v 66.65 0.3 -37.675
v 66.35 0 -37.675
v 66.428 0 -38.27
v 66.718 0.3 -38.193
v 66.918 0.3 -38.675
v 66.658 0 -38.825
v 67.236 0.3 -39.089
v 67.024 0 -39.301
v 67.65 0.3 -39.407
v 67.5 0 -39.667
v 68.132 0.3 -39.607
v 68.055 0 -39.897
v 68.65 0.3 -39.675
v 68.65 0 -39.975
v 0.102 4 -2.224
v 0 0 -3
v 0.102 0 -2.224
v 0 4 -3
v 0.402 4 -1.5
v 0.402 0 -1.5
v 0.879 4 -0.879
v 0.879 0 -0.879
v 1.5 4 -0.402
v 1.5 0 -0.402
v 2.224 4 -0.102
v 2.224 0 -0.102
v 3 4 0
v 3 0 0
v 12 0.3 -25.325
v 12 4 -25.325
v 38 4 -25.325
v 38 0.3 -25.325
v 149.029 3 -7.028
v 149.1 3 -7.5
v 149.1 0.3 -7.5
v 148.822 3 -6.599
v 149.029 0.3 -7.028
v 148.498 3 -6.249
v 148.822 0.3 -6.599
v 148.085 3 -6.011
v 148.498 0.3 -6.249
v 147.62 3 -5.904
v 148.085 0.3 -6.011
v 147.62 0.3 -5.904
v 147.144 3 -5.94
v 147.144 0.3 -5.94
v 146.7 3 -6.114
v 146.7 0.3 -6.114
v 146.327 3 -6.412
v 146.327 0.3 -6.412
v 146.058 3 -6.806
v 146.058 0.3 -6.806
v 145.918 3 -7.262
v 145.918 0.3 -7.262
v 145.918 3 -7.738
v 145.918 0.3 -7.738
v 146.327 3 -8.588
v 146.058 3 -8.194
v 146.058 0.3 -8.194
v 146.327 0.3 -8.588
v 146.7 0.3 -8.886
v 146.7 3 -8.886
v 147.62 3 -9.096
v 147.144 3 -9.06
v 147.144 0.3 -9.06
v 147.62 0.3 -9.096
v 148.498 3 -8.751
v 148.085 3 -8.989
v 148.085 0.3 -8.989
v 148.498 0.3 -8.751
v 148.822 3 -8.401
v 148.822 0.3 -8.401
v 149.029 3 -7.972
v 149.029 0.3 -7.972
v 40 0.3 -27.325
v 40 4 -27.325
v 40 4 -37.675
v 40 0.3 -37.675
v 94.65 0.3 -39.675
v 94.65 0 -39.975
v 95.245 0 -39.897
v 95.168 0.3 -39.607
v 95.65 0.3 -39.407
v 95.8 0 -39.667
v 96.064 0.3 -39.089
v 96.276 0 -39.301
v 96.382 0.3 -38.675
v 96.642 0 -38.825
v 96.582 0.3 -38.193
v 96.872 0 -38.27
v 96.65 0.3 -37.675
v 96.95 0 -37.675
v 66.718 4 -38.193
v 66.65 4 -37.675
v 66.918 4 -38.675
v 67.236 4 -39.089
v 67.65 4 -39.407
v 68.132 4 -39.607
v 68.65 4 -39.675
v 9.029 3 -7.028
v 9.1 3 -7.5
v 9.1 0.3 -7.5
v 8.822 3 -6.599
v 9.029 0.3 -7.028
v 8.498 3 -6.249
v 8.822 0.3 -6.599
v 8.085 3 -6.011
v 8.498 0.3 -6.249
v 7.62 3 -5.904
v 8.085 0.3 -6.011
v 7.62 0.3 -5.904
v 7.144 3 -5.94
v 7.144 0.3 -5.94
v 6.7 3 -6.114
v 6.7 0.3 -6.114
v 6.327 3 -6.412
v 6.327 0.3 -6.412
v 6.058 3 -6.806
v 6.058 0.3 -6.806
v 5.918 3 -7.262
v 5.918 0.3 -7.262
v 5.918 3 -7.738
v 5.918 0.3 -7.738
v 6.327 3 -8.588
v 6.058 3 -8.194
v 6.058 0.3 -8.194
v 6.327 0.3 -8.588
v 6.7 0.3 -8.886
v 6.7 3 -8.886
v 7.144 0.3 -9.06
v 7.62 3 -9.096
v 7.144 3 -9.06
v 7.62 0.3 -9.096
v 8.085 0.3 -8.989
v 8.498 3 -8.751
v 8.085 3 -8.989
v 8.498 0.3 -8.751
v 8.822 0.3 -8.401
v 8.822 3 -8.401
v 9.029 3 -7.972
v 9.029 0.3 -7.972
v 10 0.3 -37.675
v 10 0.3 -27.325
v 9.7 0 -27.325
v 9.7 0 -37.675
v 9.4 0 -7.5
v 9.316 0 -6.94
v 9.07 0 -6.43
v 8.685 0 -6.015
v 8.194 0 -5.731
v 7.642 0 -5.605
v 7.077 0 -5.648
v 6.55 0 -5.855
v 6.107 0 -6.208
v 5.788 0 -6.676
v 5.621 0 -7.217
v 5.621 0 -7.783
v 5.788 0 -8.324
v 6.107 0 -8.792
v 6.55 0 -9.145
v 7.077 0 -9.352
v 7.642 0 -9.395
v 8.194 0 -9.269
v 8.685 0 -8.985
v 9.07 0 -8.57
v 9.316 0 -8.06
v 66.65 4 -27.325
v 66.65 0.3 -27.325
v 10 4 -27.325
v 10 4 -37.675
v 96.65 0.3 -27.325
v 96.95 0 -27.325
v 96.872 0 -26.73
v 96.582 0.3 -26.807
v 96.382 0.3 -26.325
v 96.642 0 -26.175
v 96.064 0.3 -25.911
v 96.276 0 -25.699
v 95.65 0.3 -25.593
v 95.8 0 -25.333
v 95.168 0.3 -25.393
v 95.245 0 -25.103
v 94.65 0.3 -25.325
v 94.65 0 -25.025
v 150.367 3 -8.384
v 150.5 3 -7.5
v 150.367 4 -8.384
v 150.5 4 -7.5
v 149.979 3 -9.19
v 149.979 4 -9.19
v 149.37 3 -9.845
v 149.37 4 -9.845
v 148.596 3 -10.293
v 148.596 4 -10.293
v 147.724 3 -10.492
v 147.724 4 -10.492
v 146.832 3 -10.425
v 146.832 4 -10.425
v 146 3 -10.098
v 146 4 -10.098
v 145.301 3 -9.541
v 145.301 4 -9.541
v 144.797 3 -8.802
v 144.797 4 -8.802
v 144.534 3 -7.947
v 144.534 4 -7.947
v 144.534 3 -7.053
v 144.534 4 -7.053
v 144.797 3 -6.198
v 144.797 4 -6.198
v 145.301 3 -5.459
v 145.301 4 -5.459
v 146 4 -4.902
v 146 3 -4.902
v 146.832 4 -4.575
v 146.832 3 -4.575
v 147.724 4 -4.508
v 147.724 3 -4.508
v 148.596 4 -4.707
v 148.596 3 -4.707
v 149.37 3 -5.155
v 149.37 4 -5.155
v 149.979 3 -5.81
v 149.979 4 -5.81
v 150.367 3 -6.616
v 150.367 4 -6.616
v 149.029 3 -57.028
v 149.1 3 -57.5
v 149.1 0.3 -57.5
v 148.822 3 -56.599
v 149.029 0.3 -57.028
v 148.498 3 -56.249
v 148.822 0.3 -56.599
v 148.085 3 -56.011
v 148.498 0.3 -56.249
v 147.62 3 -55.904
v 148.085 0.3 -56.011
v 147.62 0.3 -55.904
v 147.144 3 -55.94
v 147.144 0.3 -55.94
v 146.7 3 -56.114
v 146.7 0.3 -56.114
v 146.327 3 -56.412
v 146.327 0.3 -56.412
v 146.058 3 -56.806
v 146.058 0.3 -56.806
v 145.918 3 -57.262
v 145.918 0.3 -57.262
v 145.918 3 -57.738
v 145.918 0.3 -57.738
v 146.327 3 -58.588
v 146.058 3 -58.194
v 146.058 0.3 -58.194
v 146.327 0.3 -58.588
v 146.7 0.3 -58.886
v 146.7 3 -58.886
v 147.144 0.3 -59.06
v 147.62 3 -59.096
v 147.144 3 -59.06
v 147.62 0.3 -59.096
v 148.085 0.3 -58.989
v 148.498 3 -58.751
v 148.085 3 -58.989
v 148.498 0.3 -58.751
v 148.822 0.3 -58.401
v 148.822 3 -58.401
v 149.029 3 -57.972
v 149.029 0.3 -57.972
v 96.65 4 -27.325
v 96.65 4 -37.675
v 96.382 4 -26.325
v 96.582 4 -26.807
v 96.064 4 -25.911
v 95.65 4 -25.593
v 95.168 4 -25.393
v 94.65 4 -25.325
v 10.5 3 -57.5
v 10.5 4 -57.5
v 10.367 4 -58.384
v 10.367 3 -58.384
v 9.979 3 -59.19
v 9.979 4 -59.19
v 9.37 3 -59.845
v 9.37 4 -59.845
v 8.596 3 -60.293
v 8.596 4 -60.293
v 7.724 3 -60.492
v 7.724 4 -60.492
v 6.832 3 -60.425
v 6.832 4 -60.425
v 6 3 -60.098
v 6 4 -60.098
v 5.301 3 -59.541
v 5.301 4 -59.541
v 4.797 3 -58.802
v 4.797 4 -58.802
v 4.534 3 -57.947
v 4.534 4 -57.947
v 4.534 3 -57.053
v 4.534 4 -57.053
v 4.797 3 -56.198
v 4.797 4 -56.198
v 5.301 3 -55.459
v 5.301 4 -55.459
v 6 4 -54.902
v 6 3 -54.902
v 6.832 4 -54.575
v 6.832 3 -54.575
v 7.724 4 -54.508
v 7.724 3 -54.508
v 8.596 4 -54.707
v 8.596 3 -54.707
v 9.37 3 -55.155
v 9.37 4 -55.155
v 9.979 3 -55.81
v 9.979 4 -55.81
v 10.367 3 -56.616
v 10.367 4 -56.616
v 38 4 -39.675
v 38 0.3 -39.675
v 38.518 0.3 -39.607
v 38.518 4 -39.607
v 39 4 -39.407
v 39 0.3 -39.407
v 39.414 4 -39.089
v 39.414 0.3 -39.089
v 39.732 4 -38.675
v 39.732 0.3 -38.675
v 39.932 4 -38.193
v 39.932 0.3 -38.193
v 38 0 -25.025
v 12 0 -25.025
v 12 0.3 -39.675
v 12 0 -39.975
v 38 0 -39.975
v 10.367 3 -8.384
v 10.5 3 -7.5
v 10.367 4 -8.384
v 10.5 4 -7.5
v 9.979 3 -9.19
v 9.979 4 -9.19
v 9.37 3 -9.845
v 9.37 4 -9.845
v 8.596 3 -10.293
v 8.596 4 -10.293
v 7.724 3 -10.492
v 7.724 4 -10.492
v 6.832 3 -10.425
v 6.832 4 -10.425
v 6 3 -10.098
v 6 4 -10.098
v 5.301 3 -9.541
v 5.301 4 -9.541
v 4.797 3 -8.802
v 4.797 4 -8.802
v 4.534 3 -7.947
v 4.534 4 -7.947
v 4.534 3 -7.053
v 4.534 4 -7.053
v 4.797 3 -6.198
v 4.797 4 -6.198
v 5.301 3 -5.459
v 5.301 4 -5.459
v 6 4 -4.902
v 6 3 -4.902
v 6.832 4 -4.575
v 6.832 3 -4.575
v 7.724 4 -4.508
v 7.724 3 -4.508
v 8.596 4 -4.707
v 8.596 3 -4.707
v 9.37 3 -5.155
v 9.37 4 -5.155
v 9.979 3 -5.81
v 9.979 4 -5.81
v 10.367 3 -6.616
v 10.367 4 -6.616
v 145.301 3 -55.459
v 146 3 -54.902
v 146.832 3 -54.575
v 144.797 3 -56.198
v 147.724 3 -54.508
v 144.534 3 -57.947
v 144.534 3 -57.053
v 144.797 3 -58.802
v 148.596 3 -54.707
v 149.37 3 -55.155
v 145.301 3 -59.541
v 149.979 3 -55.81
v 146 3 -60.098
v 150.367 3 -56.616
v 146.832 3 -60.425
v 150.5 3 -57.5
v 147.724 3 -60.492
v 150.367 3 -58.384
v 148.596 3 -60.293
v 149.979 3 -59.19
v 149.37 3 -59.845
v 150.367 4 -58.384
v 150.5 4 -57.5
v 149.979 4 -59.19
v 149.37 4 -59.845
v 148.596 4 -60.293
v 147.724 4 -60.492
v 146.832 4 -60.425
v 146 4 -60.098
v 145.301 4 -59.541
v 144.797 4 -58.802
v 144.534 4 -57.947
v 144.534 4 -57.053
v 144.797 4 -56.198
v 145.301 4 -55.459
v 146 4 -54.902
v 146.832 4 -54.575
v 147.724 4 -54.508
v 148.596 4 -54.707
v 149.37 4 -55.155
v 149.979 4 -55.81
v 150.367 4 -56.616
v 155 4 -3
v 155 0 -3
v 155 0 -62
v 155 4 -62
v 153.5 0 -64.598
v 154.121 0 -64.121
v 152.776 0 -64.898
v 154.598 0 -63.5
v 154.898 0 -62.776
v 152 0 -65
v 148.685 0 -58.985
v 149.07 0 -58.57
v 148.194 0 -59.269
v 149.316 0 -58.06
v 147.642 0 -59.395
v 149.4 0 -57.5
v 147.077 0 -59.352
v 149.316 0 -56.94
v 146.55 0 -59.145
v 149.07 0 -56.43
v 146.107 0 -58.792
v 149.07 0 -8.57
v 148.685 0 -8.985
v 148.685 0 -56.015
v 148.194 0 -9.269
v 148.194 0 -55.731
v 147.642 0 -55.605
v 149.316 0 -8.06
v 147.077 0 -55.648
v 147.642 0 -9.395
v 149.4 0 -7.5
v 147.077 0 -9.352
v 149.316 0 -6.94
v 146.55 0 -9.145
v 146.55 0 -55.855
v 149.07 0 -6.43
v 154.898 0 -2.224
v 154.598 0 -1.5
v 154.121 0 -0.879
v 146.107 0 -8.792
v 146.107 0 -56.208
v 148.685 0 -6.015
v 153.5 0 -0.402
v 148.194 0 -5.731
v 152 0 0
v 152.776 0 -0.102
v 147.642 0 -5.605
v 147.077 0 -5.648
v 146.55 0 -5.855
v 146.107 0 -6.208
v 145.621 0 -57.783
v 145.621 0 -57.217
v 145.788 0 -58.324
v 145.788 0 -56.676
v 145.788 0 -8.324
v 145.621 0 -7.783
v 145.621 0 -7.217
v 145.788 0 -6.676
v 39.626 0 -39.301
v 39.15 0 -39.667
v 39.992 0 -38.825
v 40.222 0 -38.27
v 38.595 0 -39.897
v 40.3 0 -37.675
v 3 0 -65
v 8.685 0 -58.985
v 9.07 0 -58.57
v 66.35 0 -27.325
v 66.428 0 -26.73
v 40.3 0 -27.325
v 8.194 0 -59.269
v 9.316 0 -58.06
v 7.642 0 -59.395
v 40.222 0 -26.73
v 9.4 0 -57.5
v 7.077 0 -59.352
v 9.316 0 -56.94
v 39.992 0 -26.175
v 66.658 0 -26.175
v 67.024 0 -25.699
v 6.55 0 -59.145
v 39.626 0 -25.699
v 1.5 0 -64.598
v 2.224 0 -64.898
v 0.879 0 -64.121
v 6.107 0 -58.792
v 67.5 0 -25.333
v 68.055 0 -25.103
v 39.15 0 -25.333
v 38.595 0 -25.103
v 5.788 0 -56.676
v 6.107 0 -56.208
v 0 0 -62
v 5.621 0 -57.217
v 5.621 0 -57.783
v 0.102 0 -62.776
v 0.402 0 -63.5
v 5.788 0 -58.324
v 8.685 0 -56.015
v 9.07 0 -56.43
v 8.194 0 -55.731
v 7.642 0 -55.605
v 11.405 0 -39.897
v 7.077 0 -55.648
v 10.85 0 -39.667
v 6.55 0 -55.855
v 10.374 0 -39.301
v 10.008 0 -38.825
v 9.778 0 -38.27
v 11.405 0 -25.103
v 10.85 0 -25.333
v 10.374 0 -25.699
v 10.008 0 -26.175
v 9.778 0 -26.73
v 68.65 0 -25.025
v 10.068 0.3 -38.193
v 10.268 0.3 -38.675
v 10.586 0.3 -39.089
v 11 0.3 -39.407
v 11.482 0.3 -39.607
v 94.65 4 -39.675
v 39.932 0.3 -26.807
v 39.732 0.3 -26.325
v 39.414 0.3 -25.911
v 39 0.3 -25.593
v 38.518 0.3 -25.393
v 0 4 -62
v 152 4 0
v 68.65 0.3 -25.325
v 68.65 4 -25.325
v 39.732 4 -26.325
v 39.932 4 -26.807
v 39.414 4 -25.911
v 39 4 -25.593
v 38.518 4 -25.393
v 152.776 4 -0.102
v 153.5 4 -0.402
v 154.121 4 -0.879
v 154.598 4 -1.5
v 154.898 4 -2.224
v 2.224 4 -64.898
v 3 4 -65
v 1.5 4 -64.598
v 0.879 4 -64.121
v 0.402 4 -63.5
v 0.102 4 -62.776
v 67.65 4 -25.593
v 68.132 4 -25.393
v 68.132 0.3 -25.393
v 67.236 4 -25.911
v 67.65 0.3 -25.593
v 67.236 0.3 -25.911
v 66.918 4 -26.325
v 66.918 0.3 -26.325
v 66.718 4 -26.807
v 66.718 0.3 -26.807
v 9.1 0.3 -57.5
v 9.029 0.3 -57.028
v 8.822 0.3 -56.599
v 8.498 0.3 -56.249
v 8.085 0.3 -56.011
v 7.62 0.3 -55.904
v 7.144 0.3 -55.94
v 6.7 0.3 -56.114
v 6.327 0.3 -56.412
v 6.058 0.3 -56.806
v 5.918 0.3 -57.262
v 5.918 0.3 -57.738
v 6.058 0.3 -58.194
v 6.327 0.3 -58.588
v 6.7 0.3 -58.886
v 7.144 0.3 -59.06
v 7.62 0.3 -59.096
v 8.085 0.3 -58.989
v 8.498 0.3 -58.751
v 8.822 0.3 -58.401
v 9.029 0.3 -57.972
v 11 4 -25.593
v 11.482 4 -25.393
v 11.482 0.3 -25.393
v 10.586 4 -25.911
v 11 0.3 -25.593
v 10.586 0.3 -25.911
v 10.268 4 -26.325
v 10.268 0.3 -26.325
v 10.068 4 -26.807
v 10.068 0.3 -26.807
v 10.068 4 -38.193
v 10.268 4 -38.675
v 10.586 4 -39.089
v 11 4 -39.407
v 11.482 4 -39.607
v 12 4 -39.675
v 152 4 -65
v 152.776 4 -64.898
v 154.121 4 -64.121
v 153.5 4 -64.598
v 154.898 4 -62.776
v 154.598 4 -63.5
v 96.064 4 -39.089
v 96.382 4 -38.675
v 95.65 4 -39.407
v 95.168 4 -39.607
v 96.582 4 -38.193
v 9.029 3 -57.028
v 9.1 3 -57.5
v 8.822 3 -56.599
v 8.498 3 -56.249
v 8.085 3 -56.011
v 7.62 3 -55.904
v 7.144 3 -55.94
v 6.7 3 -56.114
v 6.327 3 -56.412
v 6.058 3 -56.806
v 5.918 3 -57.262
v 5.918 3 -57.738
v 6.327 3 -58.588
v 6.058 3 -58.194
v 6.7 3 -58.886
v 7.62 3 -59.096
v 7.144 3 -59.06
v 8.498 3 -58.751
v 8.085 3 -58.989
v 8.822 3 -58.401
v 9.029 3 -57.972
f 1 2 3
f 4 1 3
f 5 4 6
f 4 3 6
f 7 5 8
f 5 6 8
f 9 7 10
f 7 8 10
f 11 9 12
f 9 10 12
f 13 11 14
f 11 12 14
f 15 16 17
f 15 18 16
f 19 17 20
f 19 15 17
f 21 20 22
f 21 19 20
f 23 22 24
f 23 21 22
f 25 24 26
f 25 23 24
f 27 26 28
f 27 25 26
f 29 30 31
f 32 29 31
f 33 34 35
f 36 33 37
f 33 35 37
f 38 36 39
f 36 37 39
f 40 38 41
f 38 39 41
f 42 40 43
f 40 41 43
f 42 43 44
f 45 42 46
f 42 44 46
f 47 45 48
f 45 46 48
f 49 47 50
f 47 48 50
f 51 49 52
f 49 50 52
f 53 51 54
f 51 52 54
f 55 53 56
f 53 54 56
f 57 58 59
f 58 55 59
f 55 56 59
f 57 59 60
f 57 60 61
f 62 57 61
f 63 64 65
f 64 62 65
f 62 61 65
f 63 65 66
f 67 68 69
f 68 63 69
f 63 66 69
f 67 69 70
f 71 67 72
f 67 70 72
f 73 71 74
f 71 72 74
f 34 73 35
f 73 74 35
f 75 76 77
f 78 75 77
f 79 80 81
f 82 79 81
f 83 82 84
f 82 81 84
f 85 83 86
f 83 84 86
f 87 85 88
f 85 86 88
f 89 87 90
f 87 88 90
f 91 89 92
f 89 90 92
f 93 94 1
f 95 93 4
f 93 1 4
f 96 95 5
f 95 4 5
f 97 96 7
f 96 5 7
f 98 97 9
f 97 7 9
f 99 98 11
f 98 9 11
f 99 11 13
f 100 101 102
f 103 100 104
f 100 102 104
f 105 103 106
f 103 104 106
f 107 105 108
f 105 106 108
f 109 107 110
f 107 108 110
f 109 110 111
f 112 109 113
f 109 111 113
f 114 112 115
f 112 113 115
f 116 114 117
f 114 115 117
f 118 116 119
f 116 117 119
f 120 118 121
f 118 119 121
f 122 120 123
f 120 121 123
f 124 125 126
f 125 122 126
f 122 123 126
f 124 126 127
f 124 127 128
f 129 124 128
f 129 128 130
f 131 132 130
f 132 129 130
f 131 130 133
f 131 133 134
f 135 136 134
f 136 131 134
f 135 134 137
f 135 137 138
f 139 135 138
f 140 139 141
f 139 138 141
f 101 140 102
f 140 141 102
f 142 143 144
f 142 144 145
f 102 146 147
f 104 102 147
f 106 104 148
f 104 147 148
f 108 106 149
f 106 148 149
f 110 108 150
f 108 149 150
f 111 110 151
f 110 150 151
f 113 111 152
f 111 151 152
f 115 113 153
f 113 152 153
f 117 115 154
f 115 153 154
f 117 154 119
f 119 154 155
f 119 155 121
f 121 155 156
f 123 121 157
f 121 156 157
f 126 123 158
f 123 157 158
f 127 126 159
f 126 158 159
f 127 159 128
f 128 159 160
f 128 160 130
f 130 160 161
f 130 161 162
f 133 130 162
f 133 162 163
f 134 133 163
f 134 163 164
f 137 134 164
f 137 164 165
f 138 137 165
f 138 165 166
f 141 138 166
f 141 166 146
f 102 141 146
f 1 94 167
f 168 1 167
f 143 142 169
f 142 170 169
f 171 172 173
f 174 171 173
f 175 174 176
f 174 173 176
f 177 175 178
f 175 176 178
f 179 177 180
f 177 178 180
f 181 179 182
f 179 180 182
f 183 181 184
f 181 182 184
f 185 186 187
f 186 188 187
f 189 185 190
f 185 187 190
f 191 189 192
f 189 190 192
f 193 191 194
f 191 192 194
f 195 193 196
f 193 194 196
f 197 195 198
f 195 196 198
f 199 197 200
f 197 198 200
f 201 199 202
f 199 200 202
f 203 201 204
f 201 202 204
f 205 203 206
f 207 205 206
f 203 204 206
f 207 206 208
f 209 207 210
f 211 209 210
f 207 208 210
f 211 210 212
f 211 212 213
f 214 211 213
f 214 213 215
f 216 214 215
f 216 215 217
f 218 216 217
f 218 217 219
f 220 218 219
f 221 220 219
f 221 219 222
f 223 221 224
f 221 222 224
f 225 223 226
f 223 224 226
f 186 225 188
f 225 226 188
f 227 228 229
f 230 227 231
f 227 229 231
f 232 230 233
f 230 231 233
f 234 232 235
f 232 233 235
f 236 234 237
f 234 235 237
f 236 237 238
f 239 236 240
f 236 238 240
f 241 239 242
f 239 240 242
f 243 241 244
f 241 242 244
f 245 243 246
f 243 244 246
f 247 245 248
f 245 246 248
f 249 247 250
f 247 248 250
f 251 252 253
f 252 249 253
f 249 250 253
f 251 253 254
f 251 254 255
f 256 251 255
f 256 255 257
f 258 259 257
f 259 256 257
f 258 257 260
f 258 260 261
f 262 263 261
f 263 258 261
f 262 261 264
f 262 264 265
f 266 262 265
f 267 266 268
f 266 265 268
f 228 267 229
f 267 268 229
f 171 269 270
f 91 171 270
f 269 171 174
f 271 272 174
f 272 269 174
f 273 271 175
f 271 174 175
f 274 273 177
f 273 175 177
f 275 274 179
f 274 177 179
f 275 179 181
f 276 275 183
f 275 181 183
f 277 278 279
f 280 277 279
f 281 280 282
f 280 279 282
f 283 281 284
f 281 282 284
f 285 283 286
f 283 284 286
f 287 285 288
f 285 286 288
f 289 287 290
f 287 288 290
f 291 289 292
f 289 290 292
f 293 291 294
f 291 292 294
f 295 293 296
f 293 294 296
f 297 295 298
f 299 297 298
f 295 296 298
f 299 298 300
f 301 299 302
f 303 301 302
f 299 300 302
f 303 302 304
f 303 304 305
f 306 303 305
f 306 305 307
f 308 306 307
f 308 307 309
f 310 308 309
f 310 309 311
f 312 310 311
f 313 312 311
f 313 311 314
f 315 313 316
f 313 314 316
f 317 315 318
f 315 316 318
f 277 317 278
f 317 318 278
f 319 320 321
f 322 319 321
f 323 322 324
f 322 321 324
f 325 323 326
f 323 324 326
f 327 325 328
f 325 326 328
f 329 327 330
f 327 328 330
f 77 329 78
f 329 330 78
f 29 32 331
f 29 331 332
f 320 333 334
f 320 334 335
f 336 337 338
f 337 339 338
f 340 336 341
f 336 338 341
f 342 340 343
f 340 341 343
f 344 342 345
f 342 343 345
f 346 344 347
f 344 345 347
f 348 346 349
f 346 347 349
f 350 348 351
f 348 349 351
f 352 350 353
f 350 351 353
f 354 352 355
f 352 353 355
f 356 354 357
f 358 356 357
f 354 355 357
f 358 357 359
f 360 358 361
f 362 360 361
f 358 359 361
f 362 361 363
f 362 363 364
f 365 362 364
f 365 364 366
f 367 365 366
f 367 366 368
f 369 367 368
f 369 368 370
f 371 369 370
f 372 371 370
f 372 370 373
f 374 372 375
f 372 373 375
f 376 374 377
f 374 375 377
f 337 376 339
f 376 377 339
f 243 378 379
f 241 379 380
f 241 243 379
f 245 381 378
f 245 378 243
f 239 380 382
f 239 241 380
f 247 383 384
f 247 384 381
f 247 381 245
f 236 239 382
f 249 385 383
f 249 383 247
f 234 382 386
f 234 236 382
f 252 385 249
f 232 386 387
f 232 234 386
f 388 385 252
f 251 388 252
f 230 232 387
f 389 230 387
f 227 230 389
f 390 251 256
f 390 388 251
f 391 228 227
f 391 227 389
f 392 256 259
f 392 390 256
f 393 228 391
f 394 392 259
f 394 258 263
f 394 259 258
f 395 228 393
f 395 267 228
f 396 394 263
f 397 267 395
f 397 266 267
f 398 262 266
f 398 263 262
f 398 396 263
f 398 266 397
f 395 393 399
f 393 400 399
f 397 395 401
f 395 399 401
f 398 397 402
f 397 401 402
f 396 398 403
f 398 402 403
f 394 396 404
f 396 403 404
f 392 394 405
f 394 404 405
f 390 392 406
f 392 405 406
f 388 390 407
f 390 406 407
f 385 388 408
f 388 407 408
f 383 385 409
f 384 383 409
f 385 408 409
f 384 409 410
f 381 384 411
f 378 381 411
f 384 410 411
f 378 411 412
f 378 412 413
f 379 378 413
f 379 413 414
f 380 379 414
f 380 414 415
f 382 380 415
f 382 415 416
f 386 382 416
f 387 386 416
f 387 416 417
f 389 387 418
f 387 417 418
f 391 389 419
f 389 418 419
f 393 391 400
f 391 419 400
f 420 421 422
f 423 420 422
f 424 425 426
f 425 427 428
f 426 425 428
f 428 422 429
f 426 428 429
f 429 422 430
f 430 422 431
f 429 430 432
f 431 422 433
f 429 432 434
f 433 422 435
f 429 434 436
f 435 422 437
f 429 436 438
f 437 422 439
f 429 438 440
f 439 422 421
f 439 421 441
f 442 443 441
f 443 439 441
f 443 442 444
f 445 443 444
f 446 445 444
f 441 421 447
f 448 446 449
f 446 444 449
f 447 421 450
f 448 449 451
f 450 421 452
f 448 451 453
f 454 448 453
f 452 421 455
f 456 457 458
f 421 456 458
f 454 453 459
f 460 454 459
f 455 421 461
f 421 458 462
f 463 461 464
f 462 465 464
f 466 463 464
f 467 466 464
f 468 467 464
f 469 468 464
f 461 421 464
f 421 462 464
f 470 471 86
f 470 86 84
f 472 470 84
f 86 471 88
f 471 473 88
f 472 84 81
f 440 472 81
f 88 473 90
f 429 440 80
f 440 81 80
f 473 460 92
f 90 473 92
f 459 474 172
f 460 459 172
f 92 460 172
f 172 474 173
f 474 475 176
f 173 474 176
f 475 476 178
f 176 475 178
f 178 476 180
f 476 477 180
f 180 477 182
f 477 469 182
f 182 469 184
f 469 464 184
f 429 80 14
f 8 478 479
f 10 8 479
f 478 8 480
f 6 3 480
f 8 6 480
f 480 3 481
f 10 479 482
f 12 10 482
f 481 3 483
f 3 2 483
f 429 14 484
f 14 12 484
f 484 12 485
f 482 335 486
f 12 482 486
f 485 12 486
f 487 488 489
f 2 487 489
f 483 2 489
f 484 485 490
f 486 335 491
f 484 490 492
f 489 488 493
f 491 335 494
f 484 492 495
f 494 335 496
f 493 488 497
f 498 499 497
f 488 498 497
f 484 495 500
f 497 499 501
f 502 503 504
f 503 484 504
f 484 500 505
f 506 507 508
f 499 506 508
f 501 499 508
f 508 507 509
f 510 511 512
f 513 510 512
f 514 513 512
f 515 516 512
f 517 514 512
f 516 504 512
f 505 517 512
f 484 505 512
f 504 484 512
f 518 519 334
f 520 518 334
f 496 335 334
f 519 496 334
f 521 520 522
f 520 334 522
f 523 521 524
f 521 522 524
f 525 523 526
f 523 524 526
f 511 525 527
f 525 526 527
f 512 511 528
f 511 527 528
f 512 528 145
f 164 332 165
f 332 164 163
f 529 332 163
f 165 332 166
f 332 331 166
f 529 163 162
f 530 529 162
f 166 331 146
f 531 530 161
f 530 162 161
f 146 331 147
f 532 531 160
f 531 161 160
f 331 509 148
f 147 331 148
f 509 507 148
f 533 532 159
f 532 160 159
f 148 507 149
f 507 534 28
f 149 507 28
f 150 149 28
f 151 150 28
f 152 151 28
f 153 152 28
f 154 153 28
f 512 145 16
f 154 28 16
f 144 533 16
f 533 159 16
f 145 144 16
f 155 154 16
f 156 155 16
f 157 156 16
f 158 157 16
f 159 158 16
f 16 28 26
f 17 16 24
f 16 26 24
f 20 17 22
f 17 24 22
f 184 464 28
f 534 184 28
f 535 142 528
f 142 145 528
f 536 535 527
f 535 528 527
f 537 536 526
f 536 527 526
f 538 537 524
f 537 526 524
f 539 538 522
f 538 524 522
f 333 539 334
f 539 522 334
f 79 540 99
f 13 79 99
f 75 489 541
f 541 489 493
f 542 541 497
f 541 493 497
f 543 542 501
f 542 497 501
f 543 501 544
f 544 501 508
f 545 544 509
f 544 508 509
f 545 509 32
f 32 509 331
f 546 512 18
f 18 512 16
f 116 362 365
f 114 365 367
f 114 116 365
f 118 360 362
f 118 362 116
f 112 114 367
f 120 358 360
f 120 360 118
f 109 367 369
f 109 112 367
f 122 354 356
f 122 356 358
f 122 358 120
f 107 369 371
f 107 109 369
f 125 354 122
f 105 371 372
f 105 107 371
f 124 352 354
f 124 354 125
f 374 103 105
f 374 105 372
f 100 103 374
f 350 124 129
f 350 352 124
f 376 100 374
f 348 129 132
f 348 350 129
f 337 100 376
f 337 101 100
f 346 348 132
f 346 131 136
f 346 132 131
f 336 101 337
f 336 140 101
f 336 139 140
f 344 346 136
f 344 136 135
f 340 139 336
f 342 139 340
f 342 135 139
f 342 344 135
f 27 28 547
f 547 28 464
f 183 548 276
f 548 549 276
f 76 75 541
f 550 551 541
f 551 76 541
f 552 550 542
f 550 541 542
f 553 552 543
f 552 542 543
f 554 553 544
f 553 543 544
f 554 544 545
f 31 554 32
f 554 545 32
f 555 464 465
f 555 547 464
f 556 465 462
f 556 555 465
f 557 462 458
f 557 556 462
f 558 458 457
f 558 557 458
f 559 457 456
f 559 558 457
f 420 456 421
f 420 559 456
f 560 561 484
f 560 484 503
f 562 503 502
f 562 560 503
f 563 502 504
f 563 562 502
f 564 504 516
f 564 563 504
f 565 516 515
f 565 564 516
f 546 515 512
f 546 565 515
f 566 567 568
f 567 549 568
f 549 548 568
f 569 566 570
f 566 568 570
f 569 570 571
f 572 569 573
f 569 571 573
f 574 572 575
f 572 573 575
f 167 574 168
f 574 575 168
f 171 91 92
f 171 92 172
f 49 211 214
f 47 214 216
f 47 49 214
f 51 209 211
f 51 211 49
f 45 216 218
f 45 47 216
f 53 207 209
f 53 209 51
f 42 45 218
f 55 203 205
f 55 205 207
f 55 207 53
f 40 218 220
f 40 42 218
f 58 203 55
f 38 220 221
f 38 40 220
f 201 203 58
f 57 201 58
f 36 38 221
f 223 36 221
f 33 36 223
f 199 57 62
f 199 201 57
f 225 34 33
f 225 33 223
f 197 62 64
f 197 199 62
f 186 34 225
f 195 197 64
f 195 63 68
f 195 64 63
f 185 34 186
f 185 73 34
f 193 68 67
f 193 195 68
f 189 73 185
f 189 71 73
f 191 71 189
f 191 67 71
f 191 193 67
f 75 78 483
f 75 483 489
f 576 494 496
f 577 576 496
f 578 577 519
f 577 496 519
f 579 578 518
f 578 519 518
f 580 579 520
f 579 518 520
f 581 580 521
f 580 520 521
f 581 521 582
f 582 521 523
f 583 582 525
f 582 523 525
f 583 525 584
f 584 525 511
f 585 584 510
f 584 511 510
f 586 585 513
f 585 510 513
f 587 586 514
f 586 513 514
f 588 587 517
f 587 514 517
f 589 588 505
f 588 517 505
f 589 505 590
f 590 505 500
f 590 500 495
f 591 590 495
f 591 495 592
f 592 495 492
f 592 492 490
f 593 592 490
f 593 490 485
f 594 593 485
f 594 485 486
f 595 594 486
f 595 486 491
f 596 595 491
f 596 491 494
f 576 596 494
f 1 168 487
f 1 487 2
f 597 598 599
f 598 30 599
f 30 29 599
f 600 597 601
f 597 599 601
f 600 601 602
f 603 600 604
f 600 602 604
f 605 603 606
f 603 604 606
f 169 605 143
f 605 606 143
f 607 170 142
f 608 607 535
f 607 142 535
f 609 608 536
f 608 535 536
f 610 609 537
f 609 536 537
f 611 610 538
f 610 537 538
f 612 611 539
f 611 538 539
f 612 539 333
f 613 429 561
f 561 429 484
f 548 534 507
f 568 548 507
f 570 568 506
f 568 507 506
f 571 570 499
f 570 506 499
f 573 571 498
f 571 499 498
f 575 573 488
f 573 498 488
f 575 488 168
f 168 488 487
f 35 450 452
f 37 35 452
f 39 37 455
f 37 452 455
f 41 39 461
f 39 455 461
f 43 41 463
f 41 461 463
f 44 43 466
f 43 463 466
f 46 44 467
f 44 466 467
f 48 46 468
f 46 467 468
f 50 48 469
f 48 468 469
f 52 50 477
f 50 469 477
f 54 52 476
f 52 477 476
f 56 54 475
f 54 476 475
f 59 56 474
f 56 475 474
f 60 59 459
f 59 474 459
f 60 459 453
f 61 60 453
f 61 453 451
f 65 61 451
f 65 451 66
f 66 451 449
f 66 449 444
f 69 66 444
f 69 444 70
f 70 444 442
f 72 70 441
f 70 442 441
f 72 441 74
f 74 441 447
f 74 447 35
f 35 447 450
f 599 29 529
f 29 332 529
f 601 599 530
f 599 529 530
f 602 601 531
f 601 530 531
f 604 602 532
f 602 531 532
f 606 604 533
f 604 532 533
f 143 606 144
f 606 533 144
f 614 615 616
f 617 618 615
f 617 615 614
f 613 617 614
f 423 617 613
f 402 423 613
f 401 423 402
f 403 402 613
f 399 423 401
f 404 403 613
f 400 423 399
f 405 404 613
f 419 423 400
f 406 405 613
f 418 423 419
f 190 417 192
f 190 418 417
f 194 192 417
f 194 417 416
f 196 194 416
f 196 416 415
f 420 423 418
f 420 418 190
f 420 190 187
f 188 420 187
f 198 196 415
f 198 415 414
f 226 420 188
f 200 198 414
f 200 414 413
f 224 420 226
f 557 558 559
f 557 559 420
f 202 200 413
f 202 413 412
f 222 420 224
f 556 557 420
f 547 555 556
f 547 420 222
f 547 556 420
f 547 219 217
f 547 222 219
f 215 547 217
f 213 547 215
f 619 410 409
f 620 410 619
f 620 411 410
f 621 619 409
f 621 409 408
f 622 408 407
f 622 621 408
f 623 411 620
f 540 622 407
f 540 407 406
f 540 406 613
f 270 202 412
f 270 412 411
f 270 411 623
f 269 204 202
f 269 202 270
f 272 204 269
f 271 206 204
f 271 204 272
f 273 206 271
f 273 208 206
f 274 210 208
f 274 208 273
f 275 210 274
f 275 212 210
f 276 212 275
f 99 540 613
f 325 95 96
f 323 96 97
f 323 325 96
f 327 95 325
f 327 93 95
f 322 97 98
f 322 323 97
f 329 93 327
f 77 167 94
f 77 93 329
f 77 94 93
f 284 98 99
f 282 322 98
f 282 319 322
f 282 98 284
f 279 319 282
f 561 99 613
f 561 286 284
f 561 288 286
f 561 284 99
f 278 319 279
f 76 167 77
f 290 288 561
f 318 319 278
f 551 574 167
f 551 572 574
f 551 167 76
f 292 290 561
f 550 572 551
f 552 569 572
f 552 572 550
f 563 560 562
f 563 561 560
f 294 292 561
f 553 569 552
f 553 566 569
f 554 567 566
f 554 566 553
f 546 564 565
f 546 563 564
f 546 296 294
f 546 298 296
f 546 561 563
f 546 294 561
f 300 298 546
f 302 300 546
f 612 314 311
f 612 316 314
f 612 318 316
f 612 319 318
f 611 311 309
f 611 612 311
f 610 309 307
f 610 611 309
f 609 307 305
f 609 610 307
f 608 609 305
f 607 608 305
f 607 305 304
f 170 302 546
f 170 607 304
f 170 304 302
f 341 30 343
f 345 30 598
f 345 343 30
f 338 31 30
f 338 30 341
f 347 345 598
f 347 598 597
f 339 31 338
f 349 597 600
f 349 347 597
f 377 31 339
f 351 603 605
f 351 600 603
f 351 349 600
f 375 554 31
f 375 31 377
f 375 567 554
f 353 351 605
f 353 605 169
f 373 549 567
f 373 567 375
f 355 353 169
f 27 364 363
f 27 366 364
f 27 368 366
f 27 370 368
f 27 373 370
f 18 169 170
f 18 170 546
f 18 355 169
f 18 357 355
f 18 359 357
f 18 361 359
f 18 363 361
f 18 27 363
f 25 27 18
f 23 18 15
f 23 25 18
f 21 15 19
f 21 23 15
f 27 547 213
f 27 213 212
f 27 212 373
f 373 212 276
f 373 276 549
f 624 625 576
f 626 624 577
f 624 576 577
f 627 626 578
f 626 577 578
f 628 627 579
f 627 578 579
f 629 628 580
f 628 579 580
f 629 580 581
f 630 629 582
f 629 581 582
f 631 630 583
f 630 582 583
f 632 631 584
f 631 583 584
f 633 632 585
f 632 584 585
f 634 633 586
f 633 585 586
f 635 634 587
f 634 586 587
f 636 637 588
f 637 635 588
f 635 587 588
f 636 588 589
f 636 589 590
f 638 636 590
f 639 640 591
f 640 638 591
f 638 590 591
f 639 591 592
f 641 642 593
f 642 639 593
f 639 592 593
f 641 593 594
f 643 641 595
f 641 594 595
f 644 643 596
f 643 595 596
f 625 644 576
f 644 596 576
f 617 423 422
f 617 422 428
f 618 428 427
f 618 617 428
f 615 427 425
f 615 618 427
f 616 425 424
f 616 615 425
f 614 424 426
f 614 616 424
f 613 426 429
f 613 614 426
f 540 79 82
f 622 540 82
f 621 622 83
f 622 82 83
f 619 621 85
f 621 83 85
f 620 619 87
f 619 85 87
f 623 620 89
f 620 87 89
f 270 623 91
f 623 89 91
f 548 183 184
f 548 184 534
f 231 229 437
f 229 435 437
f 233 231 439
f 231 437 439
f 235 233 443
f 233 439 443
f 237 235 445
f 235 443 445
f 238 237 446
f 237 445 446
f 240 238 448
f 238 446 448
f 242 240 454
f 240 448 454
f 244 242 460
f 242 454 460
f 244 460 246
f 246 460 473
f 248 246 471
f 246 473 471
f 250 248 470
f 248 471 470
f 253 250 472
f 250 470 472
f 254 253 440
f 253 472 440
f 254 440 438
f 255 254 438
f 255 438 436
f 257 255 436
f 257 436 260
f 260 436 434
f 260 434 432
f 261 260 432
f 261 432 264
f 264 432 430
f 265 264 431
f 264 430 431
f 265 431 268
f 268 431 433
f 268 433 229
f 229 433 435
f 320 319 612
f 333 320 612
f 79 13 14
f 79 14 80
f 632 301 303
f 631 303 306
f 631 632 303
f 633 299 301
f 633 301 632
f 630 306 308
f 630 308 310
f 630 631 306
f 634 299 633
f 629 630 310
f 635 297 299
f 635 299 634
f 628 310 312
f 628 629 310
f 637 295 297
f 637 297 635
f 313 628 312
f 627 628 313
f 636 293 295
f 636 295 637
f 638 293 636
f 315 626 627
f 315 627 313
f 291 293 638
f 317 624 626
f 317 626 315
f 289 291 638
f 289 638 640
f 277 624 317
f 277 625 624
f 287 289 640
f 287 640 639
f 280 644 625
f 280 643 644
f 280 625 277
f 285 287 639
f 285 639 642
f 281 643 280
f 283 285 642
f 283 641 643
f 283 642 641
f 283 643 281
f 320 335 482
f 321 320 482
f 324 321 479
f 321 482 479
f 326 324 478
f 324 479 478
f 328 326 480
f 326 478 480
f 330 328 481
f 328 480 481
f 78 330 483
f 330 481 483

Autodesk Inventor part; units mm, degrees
ref_plane "YZ Plane" through (0, 0, 0) normal (1, 0, 0) x (0, 1, 0)
ref_plane "XZ Plane" through (0, 0, 0) normal (0, 1, 0) x (-1, 0, 0)
ref_plane "XY Plane" through (0, 0, 0) normal (0, 0, 1) x (1, 0, 0)
sketch "Sketch1" plane through (0, 0, 0) normal (0, 1, 0) x (-1, 0, 0)
  line L0 (0, 0) -> (-155, 0)
  line L1 (-155, 0) -> (-155, -65)
  line L2 (-155, -65) -> (0, -65)
  line L3 (0, -65) -> (0, 0)
  dimension "d0" = 155
  dimension "d1" = 65
extrude "Extrusion1" add sketch "Sketch1" along normal blind 4
sketch "Sketch2" plane through (0, 0, 0) normal (0, -1, 0) x (1, 0, 0)
  line L0 (155, 0) -> (155, -65) projected
  line L1 (0, 0) -> (155, 0) projected
  line L2 (0, -65) -> (0, 0) projected
  line L3 (155, -65) -> (0, -65) projected
  line L4 (3, -62) -> (3, -3)
  line L5 (3, -3) -> (152, -3)
  line L6 (152, -3) -> (152, -62)
  line L7 (152, -62) -> (3, -62)
  line L8 (152, -62) -> (143, -62)
  line L9 (143, -62) -> (143, -53)
  line L10 (143, -53) -> (152, -53)
  line L11 (152, -53) -> (152, -62)
  circle A0 centre (147.5, -57.5) radius 1.6
  dimension "d4" = 3
  dimension "d5" = 9
  dimension "d6" = 9
  dimension "d7" = 3.2
extrude "Extrusion2" cut sketch "Sketch2" against normal blind 4 contours A0
sketch "Sketch3" plane through (0, 4, 0) normal (0, 1, 0) x (1, 0, 0)
  circle A0 centre (147.5, 57.5) radius 1.6 projected
  line L0 (155, 0) -> (155, 65) projected
  line L1 (155, 65) -> (0, 65) projected
  line L2 (0, 65) -> (0, 0) projected
  line L3 (0, 0) -> (155, 0) projected
  circle A1 centre (147.5, 57.5) radius 3
  dimension "d10" = 6
extrude "Extrusion3" cut sketch "Sketch3" against normal blind 1 contours A1
sketch "Sketch4" plane through (0, 0, 0) normal (0, -1, 0) x (1, 0, 0)
  circle A0 centre (147.5, -57.5) radius 1.6 projected
  line L0 (155, 0) -> (155, -65) projected
  line L1 (0, 0) -> (155, 0) projected
  line L2 (0, -65) -> (0, 0) projected
  line L3 (155, -65) -> (0, -65) projected
  line L4 (3, -62) -> (3, -3)
  line L5 (3, -3) -> (152, -3)
  line L6 (152, -3) -> (152, -62)
  line L7 (152, -62) -> (3, -62)
  line L8 (152, -3) -> (143, -3)
  line L9 (143, -3) -> (143, -12)
  line L10 (143, -12) -> (152, -12)
  line L11 (152, -12) -> (152, -3)
  line L12 (3, -3) -> (12, -3)
  line L13 (12, -3) -> (12, -12)
  line L14 (12, -12) -> (3, -12)
  line L15 (3, -12) -> (3, -3)
  line L16 (3, -62) -> (12, -62)
  line L17 (12, -62) -> (12, -53)
  line L18 (12, -53) -> (3, -53)
  line L19 (3, -53) -> (3, -62)
  circle A1 centre (147.5, -7.5) radius 1.6
  circle A2 centre (7.5, -7.5) radius 1.6
  circle A3 centre (7.5, -57.5) radius 1.6
  dimension "d13" = 3
  dimension "d14" = 9
  dimension "d15" = 9
  dimension "d16" = 9
  dimension "d17" = 9
  dimension "d18" = 9
  dimension "d19" = 9
  dimension "d20" = 3.2
  dimension "d21" = 3.2
  dimension "d22" = 3.2
extrude "Extrusion4" cut sketch "Sketch4" against normal blind 4 contours A1 | A2 | A3
sketch "Sketch5" plane through (0, 4, 0) normal (0, 1, 0) x (1, 0, 0)
  circle A0 centre (7.5, 57.5) radius 1.6 projected
  circle A1 centre (7.5, 7.5) radius 1.6 projected
  circle A2 centre (147.5, 7.5) radius 1.6 projected
  circle A3 centre (147.5, 57.5) radius 3 projected
  line L0 (155, 0) -> (155, 65) projected
  line L1 (155, 65) -> (0, 65) projected
  line L2 (0, 65) -> (0, 0) projected
  line L3 (0, 0) -> (155, 0) projected
  circle A4 centre (7.5, 57.5) radius 3
  circle A5 centre (7.5, 7.5) radius 3
  circle A6 centre (147.5, 7.5) radius 3
  dimension "d25" = 6
  dimension "d26" = 6
  dimension "d27" = 6
extrude "Extrusion5" cut sketch "Sketch5" against normal blind 1 contours A4 | A5 | A6
fillet "Fillet1" radius 3 4 edges at (0, 2, 0) (0, 2, -65) (155, 2, 0) (155, 2, -65)
sketch "Sketch6" plane through (0, 4, 0) normal (0, 1, 0) x (1, 0, 0)
  line L0 (10, 25.325) -> (40, 25.325)
  line L1 (40, 25.325) -> (40, 39.675)
  line L2 (40, 39.675) -> (10, 39.675)
  line L3 (10, 39.675) -> (10, 25.325)
  line L4 (66.65, 25.325) -> (96.65, 25.325)
  line L5 (96.65, 25.325) -> (96.65, 39.675)
  line L6 (96.65, 39.675) -> (66.65, 39.675)
  line L7 (66.65, 39.675) -> (66.65, 25.325)
  point P0 (0, 0)
  dimension "d31" = 30
  dimension "d32" = 14.35
  dimension "d33" = 30
  dimension "d34" = 14.35
extrude "Extrusion6" cut sketch "Sketch6" against normal blind 4
fillet "Fillet2" radius 2 8 edges at (10, 2, -39.675) (40, 2, -39.675) (10, 2, -25.325) (40, 2, -25.325) (66.65, 2, -39.675) (96.65, 2, -39.675) (66.65, 2, -25.325) (96.65, 2, -25.325)
chamfer "Chamfer1" distance 0.3 angle 45 20 edges at (5.9, 0, -7.5) (10, 0, -32.5) (10.5858, 0, -25.9108) (25, 0, -25.325) (39.4142, 0, -25.9108) (40, 0, -32.5) (39.4142, 0, -39.0892) (25, 0, -39.675) (10.5858, 0, -39.0892) (67.2358, 0, -39.0892) (81.65, 0, -39.675) (96.0642, 0, -39.0892) (96.65, 0, -32.5) (96.0642, 0, -25.9108) (81.65, 0, -25.325) (67.2358, 0, -25.9108) (66.65, 0, -32.5) (5.9, 0, -57.5) (145.9, 0, -7.5) (145.9, 0, -57.5)
properties part number "arcade_box_lid_iteration3"
